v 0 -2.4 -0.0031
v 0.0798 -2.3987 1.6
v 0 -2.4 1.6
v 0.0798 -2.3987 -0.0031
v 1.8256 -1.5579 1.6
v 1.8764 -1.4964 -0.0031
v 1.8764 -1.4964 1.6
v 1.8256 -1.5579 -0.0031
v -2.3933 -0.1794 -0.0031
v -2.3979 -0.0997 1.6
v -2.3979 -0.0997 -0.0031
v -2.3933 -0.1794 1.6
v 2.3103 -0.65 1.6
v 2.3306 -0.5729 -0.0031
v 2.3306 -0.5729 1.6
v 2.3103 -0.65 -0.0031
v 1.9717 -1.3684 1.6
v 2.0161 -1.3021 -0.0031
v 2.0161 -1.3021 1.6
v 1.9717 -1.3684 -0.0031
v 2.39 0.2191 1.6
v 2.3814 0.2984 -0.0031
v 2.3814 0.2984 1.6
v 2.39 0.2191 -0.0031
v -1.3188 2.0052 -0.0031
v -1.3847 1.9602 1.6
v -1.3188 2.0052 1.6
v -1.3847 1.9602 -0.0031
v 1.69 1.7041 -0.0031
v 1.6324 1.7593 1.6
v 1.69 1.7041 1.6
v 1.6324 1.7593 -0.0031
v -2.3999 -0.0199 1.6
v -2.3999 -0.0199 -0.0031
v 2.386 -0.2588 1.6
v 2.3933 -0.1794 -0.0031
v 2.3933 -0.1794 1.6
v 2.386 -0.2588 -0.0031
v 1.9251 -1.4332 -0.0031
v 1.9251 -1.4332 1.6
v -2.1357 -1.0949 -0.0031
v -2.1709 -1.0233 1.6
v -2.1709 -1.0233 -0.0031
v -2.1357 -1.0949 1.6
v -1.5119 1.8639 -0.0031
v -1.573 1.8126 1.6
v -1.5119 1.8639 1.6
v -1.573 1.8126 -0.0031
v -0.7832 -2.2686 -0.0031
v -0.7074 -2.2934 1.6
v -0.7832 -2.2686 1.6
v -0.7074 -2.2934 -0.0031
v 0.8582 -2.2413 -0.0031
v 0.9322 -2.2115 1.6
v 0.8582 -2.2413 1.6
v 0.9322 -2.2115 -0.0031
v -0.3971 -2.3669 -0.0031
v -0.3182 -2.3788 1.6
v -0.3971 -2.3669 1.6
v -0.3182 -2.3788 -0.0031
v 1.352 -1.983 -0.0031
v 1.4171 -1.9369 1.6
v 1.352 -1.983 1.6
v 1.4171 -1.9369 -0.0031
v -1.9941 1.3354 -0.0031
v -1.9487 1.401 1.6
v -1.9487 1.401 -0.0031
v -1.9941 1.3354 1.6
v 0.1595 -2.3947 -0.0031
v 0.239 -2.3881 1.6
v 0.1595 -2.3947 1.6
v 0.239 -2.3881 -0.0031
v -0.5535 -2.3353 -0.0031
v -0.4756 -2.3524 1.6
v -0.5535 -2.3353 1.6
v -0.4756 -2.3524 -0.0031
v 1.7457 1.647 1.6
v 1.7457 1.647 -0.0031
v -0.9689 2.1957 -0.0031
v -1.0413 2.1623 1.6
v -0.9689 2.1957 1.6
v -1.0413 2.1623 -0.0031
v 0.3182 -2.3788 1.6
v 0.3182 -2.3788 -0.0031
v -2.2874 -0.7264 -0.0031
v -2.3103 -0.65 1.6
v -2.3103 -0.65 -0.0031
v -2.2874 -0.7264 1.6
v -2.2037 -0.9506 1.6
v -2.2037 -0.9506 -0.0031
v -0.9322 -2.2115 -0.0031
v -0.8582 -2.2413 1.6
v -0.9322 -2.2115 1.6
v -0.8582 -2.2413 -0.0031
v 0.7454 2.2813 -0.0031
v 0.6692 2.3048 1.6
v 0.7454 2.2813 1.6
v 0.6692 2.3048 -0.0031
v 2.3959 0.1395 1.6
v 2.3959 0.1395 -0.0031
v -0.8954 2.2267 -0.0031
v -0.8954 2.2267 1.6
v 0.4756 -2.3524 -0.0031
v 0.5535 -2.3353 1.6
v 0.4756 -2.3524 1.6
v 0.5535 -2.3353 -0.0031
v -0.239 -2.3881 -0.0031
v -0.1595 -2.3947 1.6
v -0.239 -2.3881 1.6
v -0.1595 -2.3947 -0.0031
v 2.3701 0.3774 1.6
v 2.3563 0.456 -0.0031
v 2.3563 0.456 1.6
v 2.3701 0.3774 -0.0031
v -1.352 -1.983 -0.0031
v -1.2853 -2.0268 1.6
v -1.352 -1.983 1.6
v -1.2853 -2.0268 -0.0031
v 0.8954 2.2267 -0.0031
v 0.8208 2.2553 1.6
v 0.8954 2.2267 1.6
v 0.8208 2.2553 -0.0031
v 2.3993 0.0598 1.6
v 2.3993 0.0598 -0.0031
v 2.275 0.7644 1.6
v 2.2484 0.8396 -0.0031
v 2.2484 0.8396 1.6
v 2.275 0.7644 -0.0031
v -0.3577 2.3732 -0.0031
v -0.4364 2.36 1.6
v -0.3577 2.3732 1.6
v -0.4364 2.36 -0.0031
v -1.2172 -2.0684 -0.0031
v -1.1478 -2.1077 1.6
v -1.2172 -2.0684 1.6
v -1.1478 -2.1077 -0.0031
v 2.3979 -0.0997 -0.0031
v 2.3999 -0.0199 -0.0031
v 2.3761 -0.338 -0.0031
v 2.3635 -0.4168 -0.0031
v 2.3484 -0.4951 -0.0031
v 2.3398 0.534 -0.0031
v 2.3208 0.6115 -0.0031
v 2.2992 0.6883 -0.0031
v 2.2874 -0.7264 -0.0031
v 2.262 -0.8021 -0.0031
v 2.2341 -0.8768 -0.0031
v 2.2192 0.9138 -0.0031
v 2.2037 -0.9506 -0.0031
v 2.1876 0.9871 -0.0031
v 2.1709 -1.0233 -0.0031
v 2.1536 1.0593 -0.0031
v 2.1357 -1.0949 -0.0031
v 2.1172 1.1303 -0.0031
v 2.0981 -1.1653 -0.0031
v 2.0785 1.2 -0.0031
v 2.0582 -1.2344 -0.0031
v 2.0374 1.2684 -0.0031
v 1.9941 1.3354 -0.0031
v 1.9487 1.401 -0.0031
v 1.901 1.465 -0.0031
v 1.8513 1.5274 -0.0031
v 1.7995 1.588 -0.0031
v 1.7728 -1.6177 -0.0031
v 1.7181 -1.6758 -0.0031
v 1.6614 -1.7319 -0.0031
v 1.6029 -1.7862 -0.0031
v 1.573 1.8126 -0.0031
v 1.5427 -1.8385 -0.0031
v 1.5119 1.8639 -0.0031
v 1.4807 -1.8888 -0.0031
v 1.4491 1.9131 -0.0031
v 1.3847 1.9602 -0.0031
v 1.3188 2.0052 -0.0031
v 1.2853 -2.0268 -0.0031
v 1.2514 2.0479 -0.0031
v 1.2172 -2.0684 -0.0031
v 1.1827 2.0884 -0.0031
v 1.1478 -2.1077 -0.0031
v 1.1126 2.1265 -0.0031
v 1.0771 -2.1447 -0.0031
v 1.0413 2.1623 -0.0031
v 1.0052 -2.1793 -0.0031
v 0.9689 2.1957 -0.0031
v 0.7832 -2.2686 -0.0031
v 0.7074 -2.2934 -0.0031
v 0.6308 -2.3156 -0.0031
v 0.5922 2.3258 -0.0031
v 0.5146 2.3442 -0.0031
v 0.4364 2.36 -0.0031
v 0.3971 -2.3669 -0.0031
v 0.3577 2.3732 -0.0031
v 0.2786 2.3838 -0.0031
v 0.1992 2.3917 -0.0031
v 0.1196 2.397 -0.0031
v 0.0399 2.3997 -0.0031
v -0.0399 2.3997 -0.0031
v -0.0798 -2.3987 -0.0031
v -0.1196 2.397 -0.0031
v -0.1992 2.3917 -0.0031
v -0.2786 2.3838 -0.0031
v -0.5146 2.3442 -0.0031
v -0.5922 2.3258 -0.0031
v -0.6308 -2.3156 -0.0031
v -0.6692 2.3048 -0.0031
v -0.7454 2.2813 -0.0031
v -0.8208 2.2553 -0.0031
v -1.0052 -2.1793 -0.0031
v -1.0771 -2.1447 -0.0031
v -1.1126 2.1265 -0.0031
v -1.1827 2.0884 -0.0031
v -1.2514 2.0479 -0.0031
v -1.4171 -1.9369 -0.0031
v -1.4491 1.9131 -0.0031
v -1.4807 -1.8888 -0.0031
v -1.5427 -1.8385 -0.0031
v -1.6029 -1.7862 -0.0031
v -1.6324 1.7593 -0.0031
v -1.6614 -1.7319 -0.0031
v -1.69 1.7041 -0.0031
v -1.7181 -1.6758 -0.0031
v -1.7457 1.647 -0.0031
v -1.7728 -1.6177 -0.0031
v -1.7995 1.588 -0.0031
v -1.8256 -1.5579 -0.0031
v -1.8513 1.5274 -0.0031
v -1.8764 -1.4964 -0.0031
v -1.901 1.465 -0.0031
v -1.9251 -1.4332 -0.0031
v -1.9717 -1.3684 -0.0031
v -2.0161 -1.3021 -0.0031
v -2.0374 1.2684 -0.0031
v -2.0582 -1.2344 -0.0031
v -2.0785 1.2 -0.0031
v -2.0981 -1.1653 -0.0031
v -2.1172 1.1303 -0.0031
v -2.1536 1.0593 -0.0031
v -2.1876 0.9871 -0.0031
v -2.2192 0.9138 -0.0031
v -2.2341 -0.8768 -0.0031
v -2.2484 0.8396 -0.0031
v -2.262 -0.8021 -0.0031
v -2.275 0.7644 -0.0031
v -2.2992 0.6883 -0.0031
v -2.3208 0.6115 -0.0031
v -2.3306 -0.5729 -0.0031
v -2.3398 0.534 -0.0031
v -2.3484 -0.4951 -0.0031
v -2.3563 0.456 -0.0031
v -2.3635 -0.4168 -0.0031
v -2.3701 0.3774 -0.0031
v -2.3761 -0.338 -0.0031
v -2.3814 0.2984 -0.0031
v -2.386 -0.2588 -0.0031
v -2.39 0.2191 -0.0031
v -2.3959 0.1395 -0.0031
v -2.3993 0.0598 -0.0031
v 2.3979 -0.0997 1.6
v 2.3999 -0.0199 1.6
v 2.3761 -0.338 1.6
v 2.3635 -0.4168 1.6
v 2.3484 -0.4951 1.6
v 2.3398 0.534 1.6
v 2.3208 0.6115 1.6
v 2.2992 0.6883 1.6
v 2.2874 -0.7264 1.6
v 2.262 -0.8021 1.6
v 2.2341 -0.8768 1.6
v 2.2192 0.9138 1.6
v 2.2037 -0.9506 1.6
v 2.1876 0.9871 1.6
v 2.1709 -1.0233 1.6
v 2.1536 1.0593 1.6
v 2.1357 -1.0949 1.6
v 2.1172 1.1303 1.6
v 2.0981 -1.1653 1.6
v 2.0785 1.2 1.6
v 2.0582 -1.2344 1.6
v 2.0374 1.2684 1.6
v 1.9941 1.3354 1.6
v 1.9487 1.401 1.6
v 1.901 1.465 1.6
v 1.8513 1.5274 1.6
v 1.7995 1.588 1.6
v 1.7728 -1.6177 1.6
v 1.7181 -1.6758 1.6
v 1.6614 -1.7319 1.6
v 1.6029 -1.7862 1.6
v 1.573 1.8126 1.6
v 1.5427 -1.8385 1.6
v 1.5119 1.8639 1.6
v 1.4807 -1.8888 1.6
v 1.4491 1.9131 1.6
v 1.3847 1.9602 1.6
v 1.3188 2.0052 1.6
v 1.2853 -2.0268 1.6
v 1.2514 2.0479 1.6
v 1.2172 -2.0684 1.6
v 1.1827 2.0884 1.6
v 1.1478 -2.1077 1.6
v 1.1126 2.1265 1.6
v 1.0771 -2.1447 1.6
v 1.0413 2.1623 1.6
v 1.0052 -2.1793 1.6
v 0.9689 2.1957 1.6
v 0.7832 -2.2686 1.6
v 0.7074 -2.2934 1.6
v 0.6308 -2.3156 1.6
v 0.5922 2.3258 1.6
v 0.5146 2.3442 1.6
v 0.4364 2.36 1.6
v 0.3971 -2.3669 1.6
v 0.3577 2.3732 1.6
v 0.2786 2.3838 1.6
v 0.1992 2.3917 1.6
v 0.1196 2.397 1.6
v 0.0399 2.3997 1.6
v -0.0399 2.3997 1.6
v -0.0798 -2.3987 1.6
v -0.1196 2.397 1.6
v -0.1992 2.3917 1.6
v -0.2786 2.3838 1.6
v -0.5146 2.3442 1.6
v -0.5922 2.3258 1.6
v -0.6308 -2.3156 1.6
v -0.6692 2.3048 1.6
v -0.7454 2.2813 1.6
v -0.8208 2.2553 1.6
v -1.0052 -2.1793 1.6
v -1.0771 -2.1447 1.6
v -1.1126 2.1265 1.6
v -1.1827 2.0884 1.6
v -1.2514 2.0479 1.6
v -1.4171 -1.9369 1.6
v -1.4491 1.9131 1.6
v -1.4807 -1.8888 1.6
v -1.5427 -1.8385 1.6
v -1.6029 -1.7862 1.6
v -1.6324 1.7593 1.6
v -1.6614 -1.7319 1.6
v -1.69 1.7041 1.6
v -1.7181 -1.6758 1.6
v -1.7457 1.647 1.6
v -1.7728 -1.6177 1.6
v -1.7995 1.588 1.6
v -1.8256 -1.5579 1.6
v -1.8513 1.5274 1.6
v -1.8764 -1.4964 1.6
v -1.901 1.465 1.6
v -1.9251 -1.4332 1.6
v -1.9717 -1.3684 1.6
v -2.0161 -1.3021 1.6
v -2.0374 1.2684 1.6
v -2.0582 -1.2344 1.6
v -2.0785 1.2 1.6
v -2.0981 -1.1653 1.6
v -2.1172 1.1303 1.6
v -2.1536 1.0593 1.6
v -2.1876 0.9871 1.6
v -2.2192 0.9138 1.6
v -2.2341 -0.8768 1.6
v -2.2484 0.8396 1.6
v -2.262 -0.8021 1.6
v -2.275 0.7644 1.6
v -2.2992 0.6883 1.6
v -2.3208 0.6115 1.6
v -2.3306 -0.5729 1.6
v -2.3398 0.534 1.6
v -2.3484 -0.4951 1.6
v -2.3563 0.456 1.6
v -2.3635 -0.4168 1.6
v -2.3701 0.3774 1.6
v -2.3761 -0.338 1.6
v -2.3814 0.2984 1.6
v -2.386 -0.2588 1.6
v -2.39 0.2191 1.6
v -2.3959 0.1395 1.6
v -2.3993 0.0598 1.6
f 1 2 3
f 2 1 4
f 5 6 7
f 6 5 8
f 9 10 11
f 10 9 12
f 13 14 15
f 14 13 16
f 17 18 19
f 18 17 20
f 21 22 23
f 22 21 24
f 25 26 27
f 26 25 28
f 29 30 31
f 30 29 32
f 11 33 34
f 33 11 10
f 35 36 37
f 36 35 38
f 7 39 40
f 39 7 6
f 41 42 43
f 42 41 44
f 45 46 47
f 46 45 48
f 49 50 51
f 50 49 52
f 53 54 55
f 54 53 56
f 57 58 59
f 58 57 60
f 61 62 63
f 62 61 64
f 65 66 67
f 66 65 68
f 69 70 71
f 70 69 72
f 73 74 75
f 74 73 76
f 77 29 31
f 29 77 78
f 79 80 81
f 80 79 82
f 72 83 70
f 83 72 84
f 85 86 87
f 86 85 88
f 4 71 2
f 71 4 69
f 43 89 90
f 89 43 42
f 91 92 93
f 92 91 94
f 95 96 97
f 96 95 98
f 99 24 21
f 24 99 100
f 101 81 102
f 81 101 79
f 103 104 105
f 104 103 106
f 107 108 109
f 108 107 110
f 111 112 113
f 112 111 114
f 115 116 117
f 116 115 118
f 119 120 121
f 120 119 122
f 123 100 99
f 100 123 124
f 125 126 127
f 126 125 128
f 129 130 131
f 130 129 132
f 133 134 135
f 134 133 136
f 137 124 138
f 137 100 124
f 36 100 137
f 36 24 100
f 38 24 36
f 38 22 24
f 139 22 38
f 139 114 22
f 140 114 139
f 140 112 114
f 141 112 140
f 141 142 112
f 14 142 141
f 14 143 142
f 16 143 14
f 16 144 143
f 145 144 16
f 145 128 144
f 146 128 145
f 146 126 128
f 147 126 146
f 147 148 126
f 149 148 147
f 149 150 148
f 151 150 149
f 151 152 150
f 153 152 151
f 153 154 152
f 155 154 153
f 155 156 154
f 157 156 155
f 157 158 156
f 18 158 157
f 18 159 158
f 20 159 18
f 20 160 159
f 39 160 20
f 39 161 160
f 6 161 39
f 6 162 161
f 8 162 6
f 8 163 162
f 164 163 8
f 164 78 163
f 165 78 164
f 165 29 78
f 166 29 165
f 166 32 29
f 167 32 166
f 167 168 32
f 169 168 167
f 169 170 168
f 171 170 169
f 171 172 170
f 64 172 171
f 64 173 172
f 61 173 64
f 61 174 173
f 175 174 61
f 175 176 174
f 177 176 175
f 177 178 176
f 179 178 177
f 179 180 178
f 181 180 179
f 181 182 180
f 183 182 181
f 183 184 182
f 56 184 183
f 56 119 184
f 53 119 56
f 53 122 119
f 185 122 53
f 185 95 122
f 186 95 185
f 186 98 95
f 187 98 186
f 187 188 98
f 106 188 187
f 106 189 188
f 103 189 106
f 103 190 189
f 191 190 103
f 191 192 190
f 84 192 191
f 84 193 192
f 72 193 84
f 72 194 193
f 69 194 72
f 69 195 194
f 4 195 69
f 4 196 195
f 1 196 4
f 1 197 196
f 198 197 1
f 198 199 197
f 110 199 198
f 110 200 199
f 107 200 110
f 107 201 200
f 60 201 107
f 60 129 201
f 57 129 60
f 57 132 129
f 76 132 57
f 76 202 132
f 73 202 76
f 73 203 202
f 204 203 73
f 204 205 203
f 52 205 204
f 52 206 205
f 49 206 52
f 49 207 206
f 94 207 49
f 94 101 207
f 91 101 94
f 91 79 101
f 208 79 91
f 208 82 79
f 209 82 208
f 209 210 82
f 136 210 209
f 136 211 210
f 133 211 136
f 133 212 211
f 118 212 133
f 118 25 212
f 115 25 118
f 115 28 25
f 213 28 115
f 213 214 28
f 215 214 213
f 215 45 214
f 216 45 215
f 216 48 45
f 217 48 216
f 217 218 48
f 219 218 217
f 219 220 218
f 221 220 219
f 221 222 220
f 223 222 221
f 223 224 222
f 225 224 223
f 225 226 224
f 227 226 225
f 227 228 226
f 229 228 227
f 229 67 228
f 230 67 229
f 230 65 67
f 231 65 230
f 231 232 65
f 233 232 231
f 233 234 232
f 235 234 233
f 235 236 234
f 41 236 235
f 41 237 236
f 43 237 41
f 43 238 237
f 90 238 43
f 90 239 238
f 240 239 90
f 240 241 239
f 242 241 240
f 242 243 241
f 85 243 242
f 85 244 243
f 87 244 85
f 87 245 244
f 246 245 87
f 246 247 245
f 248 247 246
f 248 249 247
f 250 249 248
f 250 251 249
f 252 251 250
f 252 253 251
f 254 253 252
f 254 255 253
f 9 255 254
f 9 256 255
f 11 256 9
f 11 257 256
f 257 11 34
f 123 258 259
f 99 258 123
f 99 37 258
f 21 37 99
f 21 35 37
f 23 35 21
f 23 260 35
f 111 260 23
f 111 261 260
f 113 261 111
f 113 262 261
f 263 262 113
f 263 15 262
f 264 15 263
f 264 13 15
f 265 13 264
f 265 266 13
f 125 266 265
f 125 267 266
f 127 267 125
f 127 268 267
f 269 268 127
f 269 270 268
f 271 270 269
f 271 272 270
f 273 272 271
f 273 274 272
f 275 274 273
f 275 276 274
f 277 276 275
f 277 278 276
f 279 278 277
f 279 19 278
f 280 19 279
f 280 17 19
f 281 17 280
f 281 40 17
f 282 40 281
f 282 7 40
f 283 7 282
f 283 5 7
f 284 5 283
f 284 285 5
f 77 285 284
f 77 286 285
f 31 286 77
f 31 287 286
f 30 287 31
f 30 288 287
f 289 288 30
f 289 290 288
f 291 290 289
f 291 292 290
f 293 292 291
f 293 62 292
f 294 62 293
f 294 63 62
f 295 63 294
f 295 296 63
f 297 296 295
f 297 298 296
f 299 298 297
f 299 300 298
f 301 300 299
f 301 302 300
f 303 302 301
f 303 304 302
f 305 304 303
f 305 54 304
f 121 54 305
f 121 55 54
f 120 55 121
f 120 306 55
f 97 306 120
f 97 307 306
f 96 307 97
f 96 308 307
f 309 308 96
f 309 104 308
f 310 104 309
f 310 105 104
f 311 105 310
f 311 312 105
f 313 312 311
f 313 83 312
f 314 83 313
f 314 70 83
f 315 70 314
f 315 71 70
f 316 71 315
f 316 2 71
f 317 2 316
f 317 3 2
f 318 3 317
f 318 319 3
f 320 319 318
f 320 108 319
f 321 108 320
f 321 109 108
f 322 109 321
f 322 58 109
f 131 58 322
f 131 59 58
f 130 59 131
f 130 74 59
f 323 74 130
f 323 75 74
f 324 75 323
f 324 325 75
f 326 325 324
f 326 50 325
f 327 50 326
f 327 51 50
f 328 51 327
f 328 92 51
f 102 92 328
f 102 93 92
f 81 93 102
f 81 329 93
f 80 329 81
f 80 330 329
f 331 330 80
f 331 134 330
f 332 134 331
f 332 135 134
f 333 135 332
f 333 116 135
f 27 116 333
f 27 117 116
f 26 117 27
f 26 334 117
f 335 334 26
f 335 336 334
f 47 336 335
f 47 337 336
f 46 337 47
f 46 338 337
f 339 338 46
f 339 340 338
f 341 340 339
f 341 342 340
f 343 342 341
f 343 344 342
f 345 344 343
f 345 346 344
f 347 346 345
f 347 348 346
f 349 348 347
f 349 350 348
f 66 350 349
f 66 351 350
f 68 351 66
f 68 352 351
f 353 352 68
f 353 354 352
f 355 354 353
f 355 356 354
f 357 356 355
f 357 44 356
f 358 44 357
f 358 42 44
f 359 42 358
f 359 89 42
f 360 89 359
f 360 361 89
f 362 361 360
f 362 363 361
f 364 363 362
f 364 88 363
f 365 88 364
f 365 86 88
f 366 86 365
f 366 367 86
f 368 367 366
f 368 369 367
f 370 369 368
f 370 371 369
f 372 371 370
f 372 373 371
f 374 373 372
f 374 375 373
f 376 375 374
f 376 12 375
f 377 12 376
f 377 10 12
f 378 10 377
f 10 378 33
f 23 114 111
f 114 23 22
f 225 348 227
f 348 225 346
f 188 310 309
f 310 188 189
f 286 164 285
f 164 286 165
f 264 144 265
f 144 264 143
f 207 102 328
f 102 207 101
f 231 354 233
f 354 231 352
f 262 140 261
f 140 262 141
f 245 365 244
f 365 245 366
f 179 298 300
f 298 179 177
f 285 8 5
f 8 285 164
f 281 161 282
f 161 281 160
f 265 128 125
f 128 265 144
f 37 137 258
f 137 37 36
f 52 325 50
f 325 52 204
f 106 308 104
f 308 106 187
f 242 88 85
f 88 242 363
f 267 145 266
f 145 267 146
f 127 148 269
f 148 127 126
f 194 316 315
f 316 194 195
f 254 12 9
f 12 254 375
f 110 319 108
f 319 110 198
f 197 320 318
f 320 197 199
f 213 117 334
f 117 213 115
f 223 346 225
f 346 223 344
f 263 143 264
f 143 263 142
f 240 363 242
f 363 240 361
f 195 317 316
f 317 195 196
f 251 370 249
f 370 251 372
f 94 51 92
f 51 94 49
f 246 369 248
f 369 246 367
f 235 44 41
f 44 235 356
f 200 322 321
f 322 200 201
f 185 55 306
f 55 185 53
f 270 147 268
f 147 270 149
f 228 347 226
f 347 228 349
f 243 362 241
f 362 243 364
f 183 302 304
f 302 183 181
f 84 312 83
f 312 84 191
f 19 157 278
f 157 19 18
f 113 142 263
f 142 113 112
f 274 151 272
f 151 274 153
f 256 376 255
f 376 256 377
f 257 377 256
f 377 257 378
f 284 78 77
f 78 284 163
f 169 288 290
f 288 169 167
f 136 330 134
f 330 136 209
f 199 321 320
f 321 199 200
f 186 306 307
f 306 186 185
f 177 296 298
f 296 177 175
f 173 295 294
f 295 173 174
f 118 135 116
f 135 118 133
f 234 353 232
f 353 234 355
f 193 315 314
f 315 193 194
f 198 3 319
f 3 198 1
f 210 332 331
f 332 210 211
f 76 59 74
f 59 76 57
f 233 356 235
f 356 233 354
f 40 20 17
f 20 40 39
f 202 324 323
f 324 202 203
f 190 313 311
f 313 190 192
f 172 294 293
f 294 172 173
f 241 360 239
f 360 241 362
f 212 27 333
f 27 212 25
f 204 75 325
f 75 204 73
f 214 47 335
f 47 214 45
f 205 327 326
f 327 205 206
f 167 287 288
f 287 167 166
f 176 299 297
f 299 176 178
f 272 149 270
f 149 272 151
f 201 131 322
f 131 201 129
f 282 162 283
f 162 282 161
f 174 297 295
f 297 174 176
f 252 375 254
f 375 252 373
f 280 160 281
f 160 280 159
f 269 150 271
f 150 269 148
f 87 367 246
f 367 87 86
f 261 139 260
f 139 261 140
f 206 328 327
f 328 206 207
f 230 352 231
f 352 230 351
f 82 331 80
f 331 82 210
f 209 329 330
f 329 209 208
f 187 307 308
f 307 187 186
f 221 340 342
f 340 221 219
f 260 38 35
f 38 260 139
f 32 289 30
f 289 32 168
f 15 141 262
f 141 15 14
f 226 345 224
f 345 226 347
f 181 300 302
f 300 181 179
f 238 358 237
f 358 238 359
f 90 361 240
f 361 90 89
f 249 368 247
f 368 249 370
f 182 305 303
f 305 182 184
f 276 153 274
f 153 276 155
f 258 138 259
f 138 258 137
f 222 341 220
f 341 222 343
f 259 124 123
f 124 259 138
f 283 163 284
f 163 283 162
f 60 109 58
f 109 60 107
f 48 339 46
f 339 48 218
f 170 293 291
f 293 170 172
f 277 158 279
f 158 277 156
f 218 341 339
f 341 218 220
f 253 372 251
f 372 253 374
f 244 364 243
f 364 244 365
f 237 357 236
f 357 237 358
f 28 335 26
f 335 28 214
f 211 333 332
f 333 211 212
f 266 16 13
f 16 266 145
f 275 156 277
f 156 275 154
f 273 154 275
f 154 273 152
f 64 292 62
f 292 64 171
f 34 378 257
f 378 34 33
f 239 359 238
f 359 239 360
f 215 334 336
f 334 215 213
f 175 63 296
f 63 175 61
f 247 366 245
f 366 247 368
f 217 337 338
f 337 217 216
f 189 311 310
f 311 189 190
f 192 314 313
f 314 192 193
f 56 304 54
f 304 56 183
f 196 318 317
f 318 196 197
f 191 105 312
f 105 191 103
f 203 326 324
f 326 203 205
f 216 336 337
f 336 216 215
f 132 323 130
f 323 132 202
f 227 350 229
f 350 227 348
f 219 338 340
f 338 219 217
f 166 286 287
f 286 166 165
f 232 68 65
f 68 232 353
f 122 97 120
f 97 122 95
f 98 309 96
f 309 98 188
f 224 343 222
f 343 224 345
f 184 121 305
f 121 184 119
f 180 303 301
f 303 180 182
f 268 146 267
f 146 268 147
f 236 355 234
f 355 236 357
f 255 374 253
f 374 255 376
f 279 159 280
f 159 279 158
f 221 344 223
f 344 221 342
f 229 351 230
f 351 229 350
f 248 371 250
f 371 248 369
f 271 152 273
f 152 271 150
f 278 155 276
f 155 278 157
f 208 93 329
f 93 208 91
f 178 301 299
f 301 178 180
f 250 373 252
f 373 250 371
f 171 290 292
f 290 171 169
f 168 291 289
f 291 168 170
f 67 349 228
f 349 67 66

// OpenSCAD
use <../lib.scad>
use <4486c02.scad>
$fa=1; $fs=0.2;
function ldraw_lib__73313(realsolid=false) = [
// 0 =Door  1 x  4 x  5 Left with  6 Panes with TransClear Glass
// 0 Name: 73313.dat
// 0 Author: Steffen [Steffen]
// 0 !LDRAW_ORG Part Alias UPDATE 2019-02
// 0 !LICENSE Licensed under CC BY 2.0 and CC BY 4.0 : see CAreadme.txt
// 
// 0 BFC CERTIFY CCW
  [0,"BFC","CERTIFY"],
  [0,"BFC","CCW"],
// 
// 0 !HISTORY 2017-08-09 [Holly-Wood] Converted to Part Alias
// 0 !HISTORY 2019-09-09 [PTadmin] Official Update 2019-02
// 
// 
// 0 // Alias of 4486c02.dat
// 1 16 0 0 0 1 0 0 0 1 0 0 0 1 4486c02.dat
  [1,16,0,0,0,1,0,0,0,1,0,0,0,1, ldraw_lib__4486c02(realsolid)],
];
module ldraw_lib__73313(step=0, col=false, unit=2/5, alt=false, line=0.2, solid=!$preview)
    makepoly(ldraw_lib__73313(solid), step=step, col=col, unit=unit, alt=alt, line=line, solid=solid);
ldraw_lib__73313(line=0.2);
